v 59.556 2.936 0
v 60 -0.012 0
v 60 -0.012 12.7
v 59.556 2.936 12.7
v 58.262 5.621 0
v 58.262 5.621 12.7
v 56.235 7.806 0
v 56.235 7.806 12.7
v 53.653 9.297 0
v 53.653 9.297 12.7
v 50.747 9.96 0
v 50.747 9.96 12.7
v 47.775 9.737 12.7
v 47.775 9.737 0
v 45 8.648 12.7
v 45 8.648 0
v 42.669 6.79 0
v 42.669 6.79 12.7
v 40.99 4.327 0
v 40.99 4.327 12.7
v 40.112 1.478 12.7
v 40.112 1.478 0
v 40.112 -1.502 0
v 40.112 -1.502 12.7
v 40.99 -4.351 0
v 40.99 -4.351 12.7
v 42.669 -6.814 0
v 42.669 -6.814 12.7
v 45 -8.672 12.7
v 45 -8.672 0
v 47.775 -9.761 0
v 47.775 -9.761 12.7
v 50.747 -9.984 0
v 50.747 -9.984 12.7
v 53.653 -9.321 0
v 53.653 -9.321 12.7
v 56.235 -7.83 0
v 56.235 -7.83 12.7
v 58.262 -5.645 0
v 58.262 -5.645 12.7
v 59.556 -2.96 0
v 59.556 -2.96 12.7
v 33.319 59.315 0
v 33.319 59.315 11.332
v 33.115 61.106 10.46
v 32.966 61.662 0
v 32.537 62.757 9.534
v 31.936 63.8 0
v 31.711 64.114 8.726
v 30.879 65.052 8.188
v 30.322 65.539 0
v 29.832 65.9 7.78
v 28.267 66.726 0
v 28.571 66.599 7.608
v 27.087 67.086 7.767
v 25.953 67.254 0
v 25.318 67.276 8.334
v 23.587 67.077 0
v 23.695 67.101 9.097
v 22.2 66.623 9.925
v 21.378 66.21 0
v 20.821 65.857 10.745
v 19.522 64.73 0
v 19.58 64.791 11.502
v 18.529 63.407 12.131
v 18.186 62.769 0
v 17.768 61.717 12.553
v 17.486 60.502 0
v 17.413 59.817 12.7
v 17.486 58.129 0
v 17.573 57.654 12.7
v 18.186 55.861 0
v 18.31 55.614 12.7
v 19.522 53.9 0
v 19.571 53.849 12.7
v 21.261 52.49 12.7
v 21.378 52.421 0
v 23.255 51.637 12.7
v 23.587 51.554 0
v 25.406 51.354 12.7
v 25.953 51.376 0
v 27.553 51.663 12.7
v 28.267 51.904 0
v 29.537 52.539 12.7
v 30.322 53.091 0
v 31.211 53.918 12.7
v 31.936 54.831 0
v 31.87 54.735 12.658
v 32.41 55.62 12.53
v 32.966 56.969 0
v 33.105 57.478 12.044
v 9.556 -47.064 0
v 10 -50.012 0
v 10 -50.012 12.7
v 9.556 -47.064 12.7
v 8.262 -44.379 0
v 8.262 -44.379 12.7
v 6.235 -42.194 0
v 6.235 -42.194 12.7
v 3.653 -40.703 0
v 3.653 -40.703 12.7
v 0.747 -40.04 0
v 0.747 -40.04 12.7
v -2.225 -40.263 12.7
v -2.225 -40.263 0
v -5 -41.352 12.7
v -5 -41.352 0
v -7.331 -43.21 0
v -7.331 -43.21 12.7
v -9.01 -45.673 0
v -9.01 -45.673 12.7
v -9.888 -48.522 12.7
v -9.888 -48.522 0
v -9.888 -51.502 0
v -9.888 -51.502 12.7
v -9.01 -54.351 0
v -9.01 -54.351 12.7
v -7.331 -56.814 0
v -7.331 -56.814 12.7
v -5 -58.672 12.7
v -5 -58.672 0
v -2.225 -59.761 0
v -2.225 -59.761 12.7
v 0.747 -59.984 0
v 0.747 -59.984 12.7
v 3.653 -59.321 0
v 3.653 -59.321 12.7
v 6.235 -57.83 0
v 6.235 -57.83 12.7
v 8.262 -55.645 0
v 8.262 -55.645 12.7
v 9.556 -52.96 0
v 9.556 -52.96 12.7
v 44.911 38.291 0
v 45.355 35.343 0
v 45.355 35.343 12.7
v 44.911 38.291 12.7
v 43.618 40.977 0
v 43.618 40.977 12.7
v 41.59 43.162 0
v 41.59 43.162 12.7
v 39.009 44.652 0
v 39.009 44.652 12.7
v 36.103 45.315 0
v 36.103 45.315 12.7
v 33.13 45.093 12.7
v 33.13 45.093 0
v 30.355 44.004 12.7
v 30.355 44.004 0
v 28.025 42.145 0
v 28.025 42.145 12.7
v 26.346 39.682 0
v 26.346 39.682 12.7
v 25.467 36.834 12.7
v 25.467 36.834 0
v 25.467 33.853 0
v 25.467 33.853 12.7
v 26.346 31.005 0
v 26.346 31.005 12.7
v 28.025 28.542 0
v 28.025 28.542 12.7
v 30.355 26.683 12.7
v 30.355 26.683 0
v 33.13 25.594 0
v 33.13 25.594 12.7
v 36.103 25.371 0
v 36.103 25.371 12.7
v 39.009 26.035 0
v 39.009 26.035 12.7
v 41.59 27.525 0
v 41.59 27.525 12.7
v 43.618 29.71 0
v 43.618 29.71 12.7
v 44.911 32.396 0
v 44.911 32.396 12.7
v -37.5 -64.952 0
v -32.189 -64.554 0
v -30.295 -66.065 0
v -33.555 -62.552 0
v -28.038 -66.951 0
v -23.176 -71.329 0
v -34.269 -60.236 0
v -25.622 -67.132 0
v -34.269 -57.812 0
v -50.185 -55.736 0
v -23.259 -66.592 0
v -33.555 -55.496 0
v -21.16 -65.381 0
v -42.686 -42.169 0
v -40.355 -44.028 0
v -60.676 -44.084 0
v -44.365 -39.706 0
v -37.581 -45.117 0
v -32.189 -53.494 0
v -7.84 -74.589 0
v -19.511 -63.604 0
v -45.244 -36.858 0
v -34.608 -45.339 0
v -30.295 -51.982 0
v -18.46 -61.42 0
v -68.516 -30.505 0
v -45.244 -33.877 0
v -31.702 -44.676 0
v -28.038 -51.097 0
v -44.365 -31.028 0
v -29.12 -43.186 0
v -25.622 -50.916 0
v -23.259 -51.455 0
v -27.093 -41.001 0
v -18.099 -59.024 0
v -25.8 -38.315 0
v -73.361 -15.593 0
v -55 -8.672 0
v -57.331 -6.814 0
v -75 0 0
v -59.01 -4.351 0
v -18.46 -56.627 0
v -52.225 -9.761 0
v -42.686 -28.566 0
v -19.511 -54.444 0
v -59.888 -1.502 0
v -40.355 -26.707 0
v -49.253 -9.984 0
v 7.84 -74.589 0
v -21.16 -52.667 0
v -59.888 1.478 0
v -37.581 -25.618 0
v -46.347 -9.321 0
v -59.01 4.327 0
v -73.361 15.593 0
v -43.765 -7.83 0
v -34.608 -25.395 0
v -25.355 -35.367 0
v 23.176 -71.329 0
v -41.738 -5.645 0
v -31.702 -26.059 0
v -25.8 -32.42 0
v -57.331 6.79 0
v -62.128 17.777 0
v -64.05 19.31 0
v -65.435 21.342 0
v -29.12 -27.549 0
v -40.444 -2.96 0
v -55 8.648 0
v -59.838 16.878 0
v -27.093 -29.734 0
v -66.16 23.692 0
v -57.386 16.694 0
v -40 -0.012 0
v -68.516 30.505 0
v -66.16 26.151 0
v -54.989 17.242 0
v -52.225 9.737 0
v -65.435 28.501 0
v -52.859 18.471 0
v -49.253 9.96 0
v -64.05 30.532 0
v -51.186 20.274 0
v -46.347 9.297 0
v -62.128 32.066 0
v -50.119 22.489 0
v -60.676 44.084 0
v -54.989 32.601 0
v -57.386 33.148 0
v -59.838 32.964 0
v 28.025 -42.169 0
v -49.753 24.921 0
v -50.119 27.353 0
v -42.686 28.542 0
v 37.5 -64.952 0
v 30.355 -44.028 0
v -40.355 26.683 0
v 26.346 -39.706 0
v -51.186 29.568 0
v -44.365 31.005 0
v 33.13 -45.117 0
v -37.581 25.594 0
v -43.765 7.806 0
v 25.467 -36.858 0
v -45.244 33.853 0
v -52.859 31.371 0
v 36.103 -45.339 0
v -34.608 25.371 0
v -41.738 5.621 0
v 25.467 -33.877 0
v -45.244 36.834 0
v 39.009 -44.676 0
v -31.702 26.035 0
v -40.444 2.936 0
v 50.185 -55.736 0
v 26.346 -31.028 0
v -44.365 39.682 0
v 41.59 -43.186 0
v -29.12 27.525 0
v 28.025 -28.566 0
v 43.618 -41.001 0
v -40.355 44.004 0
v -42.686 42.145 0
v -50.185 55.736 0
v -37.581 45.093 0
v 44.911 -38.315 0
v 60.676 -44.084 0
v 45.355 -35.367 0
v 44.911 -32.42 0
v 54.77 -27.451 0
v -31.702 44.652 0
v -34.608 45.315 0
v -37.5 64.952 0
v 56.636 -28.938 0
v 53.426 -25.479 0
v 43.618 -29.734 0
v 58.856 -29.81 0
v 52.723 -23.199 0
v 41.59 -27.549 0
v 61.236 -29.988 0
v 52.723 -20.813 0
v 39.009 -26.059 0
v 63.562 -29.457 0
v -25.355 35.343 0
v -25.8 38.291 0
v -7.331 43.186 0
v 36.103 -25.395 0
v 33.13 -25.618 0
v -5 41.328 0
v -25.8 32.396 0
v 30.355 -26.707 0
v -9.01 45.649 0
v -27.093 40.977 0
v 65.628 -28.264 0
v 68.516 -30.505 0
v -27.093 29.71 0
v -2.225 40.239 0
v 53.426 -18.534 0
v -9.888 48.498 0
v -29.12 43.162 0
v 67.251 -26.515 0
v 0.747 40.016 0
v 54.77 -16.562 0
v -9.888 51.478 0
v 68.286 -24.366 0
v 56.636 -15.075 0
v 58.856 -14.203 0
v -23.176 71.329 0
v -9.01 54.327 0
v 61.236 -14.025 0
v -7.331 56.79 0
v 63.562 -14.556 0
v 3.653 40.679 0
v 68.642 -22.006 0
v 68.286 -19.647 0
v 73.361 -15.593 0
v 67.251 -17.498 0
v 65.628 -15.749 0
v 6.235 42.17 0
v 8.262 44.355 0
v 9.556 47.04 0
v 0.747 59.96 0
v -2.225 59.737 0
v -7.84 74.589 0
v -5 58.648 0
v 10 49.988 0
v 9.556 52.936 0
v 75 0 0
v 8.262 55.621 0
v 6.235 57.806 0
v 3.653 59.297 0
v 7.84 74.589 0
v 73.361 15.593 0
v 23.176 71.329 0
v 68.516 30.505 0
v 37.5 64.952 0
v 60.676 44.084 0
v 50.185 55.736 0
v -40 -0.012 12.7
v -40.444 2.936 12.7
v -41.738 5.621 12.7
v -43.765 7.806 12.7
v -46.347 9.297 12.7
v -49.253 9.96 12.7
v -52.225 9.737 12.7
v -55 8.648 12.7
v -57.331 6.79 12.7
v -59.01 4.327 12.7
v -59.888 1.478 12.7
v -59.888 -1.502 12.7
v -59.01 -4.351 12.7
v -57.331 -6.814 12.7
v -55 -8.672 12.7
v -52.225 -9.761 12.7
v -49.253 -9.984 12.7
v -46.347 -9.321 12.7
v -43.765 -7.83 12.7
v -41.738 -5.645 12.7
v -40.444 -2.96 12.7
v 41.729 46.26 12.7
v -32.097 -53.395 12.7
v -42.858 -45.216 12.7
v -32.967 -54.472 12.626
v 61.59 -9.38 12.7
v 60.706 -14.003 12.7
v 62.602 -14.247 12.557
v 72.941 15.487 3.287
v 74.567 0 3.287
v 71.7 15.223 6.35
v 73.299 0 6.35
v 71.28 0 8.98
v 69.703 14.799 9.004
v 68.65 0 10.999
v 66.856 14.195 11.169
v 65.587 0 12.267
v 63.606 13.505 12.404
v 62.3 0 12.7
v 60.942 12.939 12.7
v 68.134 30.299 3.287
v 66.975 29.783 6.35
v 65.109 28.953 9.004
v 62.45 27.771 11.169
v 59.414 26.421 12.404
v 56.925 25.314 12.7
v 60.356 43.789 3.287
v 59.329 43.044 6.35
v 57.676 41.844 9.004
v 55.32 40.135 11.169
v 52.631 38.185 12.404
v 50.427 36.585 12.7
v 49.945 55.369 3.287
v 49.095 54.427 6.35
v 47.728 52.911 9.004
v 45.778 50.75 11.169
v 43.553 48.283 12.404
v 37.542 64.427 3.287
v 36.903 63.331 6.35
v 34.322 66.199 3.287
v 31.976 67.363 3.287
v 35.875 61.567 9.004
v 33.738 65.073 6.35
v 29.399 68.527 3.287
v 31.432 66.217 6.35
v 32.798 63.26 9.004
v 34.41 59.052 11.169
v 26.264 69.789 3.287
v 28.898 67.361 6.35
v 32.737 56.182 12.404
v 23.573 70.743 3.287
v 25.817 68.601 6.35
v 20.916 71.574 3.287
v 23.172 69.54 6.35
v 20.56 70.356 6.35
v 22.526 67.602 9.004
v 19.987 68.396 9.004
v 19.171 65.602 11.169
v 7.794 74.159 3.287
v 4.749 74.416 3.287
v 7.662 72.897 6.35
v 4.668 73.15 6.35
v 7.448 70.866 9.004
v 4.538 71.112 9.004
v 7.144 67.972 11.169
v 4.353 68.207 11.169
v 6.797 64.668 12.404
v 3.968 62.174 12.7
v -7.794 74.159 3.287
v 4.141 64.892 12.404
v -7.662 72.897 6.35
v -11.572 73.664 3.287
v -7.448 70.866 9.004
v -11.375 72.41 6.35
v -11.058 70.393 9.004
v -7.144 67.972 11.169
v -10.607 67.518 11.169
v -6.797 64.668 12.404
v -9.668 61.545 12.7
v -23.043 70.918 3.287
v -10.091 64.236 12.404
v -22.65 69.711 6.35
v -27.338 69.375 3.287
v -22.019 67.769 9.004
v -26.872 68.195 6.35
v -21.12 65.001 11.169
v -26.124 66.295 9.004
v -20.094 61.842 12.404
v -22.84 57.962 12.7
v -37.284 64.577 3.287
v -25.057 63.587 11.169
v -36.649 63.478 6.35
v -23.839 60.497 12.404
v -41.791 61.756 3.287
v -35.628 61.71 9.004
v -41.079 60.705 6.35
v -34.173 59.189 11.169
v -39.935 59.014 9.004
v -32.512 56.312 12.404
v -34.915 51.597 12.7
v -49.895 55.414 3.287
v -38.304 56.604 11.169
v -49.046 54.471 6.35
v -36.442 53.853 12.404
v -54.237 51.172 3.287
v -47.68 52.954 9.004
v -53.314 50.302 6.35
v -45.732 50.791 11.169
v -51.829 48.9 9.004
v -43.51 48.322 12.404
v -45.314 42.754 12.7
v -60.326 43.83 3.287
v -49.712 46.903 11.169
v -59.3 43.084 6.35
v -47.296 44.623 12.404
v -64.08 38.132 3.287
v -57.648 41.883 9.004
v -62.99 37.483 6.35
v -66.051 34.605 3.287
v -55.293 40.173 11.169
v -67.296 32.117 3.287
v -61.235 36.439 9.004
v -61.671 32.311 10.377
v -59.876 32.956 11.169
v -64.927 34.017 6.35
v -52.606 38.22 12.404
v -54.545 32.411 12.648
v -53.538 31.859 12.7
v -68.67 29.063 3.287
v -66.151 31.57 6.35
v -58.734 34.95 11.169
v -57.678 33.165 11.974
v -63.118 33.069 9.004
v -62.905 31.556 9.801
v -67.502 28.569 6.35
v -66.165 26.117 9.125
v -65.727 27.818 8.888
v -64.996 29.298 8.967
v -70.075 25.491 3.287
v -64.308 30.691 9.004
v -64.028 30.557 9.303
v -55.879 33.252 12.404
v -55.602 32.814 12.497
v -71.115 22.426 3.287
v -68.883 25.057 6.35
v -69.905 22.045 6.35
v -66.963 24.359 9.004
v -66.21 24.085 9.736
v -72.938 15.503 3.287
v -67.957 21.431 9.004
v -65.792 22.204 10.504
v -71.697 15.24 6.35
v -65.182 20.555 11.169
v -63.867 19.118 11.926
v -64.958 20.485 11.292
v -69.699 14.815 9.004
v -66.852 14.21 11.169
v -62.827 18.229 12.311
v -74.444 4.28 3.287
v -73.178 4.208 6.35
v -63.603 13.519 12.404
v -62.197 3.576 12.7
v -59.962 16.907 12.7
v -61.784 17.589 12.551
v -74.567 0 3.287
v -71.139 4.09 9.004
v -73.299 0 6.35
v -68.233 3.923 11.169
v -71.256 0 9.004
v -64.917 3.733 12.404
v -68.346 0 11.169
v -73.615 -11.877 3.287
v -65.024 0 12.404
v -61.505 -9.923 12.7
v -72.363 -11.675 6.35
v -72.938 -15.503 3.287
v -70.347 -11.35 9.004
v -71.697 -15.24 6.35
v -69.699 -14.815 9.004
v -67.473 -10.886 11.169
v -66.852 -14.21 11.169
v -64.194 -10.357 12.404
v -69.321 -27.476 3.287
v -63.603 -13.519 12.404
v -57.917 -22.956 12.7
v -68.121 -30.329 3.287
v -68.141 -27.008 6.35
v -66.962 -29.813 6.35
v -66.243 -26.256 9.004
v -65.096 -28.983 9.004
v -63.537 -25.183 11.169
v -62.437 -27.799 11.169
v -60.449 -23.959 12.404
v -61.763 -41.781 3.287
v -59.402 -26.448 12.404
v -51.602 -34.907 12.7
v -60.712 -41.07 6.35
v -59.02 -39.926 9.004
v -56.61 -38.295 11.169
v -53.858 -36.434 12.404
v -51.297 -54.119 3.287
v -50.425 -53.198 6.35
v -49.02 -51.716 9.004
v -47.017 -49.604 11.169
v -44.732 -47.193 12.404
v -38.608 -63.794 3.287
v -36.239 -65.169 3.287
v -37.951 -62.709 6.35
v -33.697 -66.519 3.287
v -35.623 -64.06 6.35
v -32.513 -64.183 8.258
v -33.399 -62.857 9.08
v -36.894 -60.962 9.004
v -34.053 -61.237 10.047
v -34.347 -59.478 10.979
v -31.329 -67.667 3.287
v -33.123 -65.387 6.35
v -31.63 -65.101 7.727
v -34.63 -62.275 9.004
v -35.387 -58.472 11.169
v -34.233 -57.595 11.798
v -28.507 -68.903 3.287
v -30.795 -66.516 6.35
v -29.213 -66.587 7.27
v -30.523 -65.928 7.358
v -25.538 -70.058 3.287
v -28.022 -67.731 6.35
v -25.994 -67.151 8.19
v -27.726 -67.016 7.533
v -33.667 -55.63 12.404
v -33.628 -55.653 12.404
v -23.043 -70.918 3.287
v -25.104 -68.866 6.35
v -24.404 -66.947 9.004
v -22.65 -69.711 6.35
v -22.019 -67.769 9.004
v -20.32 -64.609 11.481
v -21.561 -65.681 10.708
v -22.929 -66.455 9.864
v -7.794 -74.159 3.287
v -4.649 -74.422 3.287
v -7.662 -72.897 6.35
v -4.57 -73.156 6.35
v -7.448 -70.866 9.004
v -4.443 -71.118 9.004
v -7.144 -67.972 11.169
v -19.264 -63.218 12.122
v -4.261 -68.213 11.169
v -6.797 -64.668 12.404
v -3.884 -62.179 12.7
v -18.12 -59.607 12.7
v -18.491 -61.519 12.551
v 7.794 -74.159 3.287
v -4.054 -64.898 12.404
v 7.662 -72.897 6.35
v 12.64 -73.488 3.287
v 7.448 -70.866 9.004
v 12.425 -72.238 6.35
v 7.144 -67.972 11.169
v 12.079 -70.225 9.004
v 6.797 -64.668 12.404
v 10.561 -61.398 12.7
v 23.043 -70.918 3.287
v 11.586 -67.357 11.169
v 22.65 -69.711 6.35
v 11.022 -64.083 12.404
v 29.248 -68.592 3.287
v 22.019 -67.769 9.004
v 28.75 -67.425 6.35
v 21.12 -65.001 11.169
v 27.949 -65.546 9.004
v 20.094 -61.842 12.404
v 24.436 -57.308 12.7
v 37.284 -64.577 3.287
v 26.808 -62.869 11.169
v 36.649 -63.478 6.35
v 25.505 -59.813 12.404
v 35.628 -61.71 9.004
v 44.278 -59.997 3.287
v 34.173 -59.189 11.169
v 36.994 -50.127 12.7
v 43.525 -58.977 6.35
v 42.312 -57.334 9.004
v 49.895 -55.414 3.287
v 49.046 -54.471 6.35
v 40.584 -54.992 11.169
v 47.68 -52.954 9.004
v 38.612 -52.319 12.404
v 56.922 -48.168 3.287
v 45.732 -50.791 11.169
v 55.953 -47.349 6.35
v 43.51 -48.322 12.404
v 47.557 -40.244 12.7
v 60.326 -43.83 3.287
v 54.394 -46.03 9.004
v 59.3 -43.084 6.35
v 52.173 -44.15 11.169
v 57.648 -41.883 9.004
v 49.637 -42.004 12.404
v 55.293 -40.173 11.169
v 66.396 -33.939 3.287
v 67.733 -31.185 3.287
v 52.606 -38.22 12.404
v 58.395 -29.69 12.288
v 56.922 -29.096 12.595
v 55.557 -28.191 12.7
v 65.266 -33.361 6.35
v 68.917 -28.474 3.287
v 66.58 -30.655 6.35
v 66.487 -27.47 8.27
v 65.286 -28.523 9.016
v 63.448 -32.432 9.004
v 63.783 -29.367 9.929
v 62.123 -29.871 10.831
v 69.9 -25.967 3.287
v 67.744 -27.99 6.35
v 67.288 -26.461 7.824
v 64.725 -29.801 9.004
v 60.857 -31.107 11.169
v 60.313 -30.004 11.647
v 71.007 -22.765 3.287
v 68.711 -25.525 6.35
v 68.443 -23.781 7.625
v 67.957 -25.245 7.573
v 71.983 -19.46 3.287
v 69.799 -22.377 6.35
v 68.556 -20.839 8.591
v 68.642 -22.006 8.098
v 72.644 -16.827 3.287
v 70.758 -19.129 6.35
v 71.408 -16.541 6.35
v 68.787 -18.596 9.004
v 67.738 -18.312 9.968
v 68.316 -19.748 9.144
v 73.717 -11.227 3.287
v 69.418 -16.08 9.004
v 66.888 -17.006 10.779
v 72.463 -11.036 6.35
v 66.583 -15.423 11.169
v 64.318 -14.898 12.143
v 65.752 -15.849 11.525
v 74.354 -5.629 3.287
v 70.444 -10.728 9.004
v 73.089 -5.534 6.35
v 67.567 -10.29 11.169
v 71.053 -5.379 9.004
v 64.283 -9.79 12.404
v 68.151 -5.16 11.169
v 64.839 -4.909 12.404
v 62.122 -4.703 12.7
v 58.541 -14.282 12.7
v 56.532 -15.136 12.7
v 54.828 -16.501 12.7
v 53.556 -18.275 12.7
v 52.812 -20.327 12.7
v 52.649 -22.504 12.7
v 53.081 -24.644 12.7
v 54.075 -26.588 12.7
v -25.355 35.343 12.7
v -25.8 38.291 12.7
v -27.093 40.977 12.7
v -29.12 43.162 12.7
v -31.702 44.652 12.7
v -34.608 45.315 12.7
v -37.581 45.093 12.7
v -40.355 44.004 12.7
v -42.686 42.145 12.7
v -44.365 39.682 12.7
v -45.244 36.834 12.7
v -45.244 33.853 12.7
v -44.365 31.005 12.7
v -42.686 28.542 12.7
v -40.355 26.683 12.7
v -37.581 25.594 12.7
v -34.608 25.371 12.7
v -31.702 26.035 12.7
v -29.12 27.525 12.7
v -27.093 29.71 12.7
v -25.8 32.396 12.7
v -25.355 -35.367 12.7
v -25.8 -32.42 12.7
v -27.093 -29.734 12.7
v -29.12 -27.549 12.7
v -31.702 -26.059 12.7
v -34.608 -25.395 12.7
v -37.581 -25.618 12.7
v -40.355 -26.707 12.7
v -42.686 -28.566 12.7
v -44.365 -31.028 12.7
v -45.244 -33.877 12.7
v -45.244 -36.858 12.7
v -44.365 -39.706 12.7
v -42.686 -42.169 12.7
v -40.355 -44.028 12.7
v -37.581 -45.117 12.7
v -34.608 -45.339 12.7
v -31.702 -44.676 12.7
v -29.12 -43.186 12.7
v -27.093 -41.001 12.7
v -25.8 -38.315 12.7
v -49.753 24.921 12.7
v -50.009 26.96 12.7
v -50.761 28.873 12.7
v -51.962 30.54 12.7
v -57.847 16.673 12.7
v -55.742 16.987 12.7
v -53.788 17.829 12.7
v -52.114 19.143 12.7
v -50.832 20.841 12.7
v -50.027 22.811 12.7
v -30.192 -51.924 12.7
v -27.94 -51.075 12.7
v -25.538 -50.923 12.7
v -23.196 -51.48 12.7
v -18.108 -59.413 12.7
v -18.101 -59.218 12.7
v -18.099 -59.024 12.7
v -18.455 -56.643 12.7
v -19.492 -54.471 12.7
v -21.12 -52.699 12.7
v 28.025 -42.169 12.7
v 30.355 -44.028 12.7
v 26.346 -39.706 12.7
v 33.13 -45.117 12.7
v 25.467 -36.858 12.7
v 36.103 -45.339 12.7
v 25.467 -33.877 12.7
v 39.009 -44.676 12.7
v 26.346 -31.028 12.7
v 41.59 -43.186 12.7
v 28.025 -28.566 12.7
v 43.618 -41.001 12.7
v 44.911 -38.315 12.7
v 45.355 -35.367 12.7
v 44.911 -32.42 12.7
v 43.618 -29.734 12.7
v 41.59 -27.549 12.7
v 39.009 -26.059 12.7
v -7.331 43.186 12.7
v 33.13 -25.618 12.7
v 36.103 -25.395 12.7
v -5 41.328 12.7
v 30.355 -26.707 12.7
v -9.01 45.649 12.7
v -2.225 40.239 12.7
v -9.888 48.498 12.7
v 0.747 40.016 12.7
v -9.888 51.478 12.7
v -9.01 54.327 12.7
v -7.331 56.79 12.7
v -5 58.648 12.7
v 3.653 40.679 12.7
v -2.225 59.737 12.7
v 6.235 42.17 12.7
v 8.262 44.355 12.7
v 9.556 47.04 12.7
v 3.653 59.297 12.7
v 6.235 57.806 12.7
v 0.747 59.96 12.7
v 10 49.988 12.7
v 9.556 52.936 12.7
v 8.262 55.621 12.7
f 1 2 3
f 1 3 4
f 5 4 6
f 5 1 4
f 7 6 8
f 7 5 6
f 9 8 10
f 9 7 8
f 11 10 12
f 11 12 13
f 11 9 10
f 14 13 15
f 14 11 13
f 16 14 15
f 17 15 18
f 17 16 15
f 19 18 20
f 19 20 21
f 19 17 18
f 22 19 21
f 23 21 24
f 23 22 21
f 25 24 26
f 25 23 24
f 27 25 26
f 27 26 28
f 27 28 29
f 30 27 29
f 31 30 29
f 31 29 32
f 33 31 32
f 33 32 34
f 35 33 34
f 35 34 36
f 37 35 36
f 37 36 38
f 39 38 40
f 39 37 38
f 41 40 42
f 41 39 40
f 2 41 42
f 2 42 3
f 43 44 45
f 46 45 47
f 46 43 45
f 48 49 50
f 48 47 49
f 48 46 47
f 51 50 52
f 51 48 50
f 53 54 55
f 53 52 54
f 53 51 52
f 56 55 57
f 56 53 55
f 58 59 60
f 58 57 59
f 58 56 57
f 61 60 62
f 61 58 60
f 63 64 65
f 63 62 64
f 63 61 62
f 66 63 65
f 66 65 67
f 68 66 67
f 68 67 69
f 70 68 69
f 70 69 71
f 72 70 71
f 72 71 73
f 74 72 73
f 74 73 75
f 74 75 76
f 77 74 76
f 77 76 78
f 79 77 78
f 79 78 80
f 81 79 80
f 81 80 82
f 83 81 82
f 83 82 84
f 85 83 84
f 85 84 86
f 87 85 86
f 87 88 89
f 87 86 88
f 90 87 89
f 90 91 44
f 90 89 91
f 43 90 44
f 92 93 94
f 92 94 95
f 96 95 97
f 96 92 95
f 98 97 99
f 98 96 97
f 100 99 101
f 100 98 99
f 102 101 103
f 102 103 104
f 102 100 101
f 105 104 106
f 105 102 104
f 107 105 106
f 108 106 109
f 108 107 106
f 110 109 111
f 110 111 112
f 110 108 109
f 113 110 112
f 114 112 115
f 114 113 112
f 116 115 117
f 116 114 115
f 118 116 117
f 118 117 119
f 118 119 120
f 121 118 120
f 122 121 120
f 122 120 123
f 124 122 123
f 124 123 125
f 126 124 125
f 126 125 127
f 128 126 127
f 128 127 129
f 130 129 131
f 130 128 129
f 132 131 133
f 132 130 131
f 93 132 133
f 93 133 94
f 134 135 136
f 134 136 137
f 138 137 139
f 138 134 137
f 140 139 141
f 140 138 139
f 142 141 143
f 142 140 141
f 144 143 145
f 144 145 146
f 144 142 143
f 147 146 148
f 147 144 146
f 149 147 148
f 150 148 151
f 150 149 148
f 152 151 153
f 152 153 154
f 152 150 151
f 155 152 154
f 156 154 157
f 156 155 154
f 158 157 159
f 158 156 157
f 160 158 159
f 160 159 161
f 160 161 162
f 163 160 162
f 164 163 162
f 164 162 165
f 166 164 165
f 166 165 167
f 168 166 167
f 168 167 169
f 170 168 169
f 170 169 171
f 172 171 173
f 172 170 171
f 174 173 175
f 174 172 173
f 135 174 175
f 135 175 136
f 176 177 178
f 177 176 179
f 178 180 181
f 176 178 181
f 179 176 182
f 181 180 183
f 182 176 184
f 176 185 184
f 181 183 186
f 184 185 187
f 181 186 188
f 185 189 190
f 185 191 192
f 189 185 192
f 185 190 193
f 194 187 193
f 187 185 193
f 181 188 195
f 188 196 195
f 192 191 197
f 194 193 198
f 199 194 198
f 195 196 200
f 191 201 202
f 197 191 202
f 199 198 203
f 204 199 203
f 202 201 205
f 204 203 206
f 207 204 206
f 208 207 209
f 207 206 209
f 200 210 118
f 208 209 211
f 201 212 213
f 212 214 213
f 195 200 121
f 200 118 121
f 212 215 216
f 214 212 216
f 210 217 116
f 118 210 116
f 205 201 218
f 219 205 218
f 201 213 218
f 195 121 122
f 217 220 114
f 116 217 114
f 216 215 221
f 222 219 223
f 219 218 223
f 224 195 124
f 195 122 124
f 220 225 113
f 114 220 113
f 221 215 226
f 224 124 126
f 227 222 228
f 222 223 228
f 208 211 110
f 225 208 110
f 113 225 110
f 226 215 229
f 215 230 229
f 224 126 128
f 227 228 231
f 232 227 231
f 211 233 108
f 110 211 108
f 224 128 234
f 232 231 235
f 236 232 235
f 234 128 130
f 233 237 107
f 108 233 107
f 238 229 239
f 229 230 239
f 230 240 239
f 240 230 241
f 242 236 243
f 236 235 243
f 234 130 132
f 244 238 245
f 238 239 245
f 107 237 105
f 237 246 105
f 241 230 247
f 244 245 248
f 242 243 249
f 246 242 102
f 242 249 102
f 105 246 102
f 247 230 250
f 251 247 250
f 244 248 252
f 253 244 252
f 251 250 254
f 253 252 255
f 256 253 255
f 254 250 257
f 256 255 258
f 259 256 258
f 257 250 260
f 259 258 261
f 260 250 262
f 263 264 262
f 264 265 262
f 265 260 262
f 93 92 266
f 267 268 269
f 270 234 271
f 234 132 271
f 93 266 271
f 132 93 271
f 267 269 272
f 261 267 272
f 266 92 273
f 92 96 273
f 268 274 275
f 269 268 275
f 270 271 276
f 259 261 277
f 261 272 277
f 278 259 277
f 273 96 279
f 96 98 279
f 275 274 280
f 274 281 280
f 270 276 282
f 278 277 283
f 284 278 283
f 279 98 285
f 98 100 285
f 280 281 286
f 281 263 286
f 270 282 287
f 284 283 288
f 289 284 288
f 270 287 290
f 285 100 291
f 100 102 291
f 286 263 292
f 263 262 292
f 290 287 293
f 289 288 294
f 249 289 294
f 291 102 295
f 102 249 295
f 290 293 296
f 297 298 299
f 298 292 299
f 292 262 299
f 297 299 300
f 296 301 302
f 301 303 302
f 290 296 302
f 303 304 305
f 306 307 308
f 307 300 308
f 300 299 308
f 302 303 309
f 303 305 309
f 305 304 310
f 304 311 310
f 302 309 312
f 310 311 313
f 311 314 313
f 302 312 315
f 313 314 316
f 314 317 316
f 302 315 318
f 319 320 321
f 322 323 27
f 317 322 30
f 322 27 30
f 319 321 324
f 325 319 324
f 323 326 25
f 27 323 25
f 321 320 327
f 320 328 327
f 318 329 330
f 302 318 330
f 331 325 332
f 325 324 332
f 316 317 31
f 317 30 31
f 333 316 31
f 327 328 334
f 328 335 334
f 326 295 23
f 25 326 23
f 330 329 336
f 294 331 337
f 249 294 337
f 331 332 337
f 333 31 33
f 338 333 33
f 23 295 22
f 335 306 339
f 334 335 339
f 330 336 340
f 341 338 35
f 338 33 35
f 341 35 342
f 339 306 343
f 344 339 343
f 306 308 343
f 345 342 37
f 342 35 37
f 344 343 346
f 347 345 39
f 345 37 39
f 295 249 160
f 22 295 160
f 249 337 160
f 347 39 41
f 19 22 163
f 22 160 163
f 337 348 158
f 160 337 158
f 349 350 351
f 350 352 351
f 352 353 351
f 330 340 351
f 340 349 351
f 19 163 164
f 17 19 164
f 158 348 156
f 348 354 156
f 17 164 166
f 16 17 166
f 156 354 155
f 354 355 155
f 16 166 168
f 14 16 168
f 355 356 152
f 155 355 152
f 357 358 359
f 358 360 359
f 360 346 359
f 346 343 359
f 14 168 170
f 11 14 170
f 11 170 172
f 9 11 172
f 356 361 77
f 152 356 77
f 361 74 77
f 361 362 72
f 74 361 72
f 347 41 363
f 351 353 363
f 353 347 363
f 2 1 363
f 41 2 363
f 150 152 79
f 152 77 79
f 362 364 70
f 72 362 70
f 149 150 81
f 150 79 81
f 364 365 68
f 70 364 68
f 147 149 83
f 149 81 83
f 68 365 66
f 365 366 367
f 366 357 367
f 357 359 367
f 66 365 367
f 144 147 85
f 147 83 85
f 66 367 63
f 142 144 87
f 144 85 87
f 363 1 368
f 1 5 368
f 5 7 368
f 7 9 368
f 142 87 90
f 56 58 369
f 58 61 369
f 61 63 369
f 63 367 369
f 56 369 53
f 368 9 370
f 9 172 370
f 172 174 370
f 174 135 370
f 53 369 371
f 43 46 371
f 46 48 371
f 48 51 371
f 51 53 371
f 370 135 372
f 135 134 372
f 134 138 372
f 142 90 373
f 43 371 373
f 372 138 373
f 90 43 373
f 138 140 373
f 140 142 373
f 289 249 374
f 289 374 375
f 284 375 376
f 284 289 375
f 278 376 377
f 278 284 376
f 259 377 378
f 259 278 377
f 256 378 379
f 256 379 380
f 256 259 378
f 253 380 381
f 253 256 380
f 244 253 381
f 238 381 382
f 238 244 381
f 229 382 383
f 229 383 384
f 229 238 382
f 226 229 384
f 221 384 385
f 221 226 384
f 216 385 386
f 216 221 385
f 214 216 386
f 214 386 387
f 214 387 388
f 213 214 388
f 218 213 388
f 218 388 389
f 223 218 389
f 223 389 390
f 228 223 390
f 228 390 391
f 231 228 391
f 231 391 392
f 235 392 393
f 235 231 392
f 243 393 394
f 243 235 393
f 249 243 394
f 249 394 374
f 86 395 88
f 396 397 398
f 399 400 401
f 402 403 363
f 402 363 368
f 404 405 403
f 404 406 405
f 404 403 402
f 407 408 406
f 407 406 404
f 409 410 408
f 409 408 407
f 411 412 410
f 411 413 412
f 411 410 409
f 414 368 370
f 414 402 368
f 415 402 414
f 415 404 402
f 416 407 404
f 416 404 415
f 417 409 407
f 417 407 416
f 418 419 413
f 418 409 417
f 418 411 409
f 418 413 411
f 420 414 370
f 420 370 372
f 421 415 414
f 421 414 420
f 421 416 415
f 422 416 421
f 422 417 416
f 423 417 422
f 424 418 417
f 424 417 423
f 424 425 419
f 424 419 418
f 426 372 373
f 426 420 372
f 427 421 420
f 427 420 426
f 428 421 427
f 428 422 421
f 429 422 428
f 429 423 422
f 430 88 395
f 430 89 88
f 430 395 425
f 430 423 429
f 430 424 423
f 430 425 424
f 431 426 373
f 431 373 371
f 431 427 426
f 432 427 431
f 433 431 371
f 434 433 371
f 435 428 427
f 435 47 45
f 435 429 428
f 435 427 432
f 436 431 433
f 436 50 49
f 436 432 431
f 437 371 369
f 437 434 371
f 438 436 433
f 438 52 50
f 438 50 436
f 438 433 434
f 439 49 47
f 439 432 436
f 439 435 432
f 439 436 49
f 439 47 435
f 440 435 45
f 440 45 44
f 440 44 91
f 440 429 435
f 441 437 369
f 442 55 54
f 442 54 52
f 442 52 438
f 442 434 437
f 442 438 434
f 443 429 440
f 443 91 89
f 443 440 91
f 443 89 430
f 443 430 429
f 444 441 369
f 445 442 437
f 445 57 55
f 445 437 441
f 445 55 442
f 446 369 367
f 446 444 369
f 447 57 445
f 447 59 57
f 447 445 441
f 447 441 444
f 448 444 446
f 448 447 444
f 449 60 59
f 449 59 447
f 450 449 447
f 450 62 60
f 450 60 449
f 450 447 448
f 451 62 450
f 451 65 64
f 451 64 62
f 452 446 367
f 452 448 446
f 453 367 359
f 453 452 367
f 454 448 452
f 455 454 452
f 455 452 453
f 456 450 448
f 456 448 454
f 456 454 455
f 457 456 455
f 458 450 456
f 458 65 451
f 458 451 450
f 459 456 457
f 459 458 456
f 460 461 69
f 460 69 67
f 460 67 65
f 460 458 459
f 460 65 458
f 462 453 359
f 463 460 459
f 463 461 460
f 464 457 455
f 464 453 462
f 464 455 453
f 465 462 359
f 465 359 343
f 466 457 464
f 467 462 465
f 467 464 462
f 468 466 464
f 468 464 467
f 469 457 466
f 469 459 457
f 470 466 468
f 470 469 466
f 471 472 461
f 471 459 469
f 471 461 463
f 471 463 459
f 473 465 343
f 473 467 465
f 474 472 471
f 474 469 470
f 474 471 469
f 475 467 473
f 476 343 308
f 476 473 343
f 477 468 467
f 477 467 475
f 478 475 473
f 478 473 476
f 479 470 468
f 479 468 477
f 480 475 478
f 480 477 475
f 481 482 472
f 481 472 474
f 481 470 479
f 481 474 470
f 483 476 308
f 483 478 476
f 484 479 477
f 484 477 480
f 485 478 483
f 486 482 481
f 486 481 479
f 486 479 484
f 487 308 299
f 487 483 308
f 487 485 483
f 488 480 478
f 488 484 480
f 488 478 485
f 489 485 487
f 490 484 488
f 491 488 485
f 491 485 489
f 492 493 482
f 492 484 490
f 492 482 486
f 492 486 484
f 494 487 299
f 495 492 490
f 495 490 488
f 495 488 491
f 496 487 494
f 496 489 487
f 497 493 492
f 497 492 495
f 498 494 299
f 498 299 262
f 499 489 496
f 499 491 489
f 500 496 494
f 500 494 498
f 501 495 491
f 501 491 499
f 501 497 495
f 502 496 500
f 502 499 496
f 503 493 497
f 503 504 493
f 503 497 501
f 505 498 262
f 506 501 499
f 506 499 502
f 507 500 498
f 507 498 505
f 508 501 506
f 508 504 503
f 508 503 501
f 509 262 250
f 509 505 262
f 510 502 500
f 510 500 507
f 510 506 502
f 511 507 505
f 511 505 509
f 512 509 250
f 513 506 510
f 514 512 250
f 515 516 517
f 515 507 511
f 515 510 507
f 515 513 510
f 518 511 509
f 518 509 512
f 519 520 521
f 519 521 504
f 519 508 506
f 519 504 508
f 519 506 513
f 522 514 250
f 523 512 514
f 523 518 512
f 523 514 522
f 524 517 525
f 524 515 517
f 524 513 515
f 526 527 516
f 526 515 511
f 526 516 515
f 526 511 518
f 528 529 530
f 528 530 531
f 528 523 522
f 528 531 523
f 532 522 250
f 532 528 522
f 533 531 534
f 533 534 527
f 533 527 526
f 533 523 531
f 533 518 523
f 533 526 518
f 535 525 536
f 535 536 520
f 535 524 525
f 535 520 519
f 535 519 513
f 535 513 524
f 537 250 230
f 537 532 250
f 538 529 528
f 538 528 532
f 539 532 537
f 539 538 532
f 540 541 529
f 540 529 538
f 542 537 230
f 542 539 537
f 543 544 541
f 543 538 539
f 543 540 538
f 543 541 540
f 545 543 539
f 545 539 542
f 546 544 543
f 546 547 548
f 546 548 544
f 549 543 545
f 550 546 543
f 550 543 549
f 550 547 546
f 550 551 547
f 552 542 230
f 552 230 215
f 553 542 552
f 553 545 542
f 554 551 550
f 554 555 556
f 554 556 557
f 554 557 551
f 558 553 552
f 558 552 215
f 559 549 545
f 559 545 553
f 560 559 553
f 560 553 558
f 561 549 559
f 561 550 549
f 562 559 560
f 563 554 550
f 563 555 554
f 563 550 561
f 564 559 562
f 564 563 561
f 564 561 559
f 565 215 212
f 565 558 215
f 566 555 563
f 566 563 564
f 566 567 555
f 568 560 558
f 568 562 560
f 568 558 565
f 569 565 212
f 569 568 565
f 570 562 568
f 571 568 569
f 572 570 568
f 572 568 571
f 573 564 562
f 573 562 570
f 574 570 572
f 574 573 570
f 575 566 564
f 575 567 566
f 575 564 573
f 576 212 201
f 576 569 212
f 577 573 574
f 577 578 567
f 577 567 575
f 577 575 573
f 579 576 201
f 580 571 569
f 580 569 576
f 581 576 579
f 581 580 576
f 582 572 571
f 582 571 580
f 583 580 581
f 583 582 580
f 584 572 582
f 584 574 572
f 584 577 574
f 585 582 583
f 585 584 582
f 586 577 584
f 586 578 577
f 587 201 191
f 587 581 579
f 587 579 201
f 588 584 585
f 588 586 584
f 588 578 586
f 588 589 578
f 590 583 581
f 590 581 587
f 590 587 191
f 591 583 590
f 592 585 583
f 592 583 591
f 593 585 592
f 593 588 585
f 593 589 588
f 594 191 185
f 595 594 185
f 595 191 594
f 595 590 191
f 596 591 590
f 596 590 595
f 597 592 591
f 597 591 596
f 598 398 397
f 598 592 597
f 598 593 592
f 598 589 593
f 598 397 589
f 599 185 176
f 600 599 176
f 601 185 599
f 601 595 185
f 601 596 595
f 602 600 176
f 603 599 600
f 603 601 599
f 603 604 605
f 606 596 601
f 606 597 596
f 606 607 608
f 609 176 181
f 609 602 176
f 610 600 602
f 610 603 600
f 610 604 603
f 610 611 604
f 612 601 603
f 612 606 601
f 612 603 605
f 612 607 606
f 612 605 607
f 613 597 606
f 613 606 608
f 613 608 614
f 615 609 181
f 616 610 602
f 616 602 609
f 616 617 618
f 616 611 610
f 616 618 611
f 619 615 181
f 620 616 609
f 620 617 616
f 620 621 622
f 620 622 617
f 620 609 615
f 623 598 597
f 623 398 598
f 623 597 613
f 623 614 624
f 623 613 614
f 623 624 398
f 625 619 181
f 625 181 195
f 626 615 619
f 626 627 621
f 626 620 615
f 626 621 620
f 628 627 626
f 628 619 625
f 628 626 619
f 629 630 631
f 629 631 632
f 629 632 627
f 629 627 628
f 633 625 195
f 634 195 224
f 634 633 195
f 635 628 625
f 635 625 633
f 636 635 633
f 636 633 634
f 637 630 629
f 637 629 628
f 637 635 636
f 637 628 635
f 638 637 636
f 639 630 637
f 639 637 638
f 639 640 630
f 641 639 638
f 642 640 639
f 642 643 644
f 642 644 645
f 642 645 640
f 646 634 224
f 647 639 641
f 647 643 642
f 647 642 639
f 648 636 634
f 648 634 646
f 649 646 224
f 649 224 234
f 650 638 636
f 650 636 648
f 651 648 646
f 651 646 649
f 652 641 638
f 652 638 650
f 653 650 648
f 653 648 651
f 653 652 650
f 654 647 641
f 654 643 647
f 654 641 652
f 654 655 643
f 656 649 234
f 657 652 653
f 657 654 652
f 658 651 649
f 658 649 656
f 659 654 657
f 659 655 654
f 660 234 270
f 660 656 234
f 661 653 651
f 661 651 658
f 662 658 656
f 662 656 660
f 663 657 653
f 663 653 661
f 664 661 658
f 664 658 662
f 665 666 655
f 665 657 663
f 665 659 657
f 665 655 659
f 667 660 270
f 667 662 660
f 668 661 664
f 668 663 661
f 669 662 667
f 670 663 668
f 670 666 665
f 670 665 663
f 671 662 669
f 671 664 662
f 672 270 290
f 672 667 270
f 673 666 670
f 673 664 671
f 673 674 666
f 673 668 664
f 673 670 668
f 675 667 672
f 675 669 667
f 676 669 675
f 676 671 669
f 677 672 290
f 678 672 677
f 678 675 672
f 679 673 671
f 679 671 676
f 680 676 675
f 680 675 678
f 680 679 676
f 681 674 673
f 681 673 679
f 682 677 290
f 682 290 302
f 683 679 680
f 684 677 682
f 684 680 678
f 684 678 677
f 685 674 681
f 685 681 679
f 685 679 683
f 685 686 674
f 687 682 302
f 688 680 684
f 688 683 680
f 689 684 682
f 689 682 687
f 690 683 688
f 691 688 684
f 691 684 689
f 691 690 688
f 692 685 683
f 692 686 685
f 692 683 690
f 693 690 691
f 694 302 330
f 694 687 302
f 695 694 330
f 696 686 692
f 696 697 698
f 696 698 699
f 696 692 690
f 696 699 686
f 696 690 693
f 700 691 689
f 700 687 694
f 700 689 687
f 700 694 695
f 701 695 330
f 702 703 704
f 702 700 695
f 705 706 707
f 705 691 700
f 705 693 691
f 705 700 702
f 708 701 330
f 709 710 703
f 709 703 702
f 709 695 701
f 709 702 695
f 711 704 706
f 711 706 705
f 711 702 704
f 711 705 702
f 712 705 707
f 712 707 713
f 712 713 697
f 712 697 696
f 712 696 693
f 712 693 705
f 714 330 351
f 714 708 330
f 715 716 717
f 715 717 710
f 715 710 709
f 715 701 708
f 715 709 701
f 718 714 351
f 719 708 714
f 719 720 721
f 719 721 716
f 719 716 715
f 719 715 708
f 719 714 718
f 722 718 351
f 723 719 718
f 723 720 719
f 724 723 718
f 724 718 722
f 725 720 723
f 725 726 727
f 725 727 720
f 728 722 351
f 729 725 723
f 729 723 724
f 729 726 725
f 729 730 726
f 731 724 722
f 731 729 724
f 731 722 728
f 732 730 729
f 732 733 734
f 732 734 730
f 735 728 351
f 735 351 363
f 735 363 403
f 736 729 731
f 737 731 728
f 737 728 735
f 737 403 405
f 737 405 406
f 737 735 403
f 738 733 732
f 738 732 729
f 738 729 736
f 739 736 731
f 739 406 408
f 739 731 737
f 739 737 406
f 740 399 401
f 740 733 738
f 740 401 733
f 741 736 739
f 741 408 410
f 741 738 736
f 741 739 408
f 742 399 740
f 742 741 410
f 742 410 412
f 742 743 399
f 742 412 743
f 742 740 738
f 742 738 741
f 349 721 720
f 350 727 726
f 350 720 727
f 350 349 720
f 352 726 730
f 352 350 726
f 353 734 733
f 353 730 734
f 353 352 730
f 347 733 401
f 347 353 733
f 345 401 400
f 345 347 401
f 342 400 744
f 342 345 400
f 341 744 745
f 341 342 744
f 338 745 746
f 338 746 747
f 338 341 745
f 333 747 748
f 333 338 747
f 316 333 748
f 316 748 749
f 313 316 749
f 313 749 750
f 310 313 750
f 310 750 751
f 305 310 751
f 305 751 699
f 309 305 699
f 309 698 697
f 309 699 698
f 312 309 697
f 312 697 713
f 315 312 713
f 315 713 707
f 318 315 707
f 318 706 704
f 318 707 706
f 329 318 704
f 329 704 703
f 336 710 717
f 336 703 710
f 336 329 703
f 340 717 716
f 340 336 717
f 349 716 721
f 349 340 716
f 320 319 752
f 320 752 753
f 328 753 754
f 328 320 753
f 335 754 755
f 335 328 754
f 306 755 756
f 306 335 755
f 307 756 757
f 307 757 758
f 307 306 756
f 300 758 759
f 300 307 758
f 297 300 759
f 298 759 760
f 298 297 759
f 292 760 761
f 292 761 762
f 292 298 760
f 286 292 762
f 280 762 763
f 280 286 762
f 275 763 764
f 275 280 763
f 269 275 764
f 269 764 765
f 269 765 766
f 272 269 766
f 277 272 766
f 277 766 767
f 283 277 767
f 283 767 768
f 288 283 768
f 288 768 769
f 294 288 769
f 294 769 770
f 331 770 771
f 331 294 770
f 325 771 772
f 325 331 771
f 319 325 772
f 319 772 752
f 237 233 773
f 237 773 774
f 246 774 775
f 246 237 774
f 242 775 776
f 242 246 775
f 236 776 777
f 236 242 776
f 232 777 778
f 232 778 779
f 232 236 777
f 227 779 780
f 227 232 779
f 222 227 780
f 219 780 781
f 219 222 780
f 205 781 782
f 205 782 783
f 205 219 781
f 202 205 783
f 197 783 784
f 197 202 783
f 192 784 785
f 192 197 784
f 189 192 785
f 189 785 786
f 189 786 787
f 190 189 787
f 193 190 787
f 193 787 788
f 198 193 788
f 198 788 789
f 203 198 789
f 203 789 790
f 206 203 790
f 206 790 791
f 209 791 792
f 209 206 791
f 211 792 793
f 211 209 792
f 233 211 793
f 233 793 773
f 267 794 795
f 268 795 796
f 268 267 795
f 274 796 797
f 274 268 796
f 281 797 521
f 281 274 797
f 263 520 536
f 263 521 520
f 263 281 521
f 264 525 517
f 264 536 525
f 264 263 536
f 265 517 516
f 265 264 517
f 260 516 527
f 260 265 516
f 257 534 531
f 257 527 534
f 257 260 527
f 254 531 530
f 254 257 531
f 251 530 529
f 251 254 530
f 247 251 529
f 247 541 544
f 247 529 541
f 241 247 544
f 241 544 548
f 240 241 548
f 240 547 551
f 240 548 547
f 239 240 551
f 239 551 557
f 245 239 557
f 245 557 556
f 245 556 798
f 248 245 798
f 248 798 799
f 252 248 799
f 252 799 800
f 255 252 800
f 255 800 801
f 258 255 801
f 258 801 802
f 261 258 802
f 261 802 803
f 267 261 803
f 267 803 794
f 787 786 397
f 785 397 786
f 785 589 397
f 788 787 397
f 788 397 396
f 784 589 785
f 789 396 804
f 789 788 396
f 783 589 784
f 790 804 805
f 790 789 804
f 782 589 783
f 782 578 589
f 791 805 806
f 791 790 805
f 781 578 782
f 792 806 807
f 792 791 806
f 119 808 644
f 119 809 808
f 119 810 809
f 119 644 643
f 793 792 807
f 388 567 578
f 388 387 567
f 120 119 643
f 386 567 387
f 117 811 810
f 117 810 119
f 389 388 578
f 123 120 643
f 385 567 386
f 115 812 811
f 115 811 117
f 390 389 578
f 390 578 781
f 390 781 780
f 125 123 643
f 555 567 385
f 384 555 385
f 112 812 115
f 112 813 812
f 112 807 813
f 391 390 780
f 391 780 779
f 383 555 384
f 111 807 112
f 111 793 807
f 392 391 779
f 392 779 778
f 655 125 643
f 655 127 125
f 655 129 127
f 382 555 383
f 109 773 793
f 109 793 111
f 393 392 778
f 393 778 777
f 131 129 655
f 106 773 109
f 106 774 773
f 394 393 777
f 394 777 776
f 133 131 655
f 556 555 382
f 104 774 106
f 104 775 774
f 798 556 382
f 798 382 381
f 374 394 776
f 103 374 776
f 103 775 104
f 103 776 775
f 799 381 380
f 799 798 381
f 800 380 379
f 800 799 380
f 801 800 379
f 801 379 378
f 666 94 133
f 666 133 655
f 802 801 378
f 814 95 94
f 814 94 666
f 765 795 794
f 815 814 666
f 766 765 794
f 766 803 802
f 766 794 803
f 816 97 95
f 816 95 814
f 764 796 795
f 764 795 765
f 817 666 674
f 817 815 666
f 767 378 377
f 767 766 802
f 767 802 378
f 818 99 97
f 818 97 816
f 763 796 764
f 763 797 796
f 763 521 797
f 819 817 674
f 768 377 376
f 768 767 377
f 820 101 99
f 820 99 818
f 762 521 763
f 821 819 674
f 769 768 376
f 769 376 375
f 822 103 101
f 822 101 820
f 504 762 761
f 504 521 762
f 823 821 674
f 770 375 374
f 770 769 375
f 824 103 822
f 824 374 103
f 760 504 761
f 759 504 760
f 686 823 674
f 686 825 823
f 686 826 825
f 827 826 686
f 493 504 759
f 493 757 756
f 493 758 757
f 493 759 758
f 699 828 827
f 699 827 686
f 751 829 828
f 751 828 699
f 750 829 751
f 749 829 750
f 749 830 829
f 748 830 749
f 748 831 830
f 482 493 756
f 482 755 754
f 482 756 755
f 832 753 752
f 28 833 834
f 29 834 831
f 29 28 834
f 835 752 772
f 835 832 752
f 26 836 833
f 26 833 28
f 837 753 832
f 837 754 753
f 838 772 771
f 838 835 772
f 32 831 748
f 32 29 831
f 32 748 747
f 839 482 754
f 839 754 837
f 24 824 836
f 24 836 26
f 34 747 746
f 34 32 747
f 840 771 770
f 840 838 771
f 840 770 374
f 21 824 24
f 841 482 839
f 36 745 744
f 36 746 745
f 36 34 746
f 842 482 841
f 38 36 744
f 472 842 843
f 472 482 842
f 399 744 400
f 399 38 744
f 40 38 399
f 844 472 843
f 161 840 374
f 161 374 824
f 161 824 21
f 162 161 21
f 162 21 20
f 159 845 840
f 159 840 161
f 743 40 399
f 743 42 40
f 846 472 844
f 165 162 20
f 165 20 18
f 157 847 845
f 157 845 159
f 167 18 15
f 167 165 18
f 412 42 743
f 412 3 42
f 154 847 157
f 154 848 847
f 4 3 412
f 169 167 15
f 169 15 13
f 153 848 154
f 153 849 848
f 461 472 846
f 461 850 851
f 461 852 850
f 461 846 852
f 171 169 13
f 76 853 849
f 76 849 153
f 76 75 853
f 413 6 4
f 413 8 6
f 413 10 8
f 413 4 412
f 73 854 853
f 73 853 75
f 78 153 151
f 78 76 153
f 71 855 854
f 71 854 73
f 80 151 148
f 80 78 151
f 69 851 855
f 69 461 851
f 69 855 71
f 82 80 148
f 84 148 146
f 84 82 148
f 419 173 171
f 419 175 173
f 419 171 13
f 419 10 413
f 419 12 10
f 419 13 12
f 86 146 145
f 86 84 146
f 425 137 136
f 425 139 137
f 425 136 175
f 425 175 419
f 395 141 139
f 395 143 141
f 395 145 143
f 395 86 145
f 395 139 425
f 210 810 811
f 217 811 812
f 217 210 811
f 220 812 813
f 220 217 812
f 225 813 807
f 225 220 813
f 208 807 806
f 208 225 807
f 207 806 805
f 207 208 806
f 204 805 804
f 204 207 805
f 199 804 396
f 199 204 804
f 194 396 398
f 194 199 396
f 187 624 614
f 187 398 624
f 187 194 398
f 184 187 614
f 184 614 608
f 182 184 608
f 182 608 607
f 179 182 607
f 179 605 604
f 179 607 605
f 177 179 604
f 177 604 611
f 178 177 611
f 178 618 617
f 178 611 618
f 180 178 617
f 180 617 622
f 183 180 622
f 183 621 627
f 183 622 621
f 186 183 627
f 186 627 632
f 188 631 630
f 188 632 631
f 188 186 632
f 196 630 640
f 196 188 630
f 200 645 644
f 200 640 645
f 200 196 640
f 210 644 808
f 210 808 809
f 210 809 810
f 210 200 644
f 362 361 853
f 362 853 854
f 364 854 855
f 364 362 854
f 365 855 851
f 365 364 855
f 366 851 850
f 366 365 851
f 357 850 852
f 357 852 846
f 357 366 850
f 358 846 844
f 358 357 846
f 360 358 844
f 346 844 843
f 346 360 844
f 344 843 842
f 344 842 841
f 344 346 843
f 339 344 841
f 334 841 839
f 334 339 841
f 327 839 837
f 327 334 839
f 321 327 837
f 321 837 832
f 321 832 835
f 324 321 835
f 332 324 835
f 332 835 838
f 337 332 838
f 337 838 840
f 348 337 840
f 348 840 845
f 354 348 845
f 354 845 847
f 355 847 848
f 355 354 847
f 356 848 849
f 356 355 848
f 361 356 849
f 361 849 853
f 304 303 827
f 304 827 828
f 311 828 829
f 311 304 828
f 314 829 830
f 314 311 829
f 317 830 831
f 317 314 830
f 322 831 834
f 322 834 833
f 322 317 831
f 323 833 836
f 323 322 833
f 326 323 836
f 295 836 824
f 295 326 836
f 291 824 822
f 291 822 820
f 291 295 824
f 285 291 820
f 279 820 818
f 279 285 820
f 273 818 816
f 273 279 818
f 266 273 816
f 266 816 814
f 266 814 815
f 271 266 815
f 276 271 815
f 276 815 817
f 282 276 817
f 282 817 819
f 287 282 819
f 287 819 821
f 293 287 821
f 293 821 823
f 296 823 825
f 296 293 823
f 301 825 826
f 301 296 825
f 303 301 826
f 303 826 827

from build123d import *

# Parameters (mm, degrees)
F0_R     = 75
F0_R_2   = 8.1306454005
F0_R_3   = 10
F0_R_4   = 8.004103626
F0_R_5   = 8.2498069198
F0_R_6   = 7.9610699334
F1_DEPTH = 12.7


# Not quite as in the source:
# - a fillet or chamfer that OpenCascade refuses, or shapes differently, is made with other operations: its cross-section is extruded or revolved along the edge and cut away or added
# - the program builds the solid bodies; features that only make, move or delete a surface that nothing else refers to are left out


with BuildPart() as f1:
    # F0 (on Top) → F1 (new body)
    with BuildSketch(Plane.XY):
        Circle(F0_R)
        with Locations((-26.2292288244, -59.023771435)):
            Circle(F0_R_2, mode=Mode.SUBTRACT)
        with Locations((-50, -0.0119686127)):
            Circle(F0_R_3, mode=Mode.SUBTRACT)
        with Locations((-35.3553390593, -35.367307672)):
            Circle(F0_R_3, mode=Mode.SUBTRACT)
        with Locations((0, -50.0119686127)):
            Circle(F0_R_3, mode=Mode.SUBTRACT)
        with Locations((35.3553390593, -35.367307672)):
            Circle(F0_R_3, mode=Mode.SUBTRACT)
        with Locations((60.637563467, -22.0063943416)):
            Circle(F0_R_4, mode=Mode.SUBTRACT)
        with Locations((50, -0.0119686127)):
            Circle(F0_R_3, mode=Mode.SUBTRACT)
        with Locations((-58.0026507378, 24.9211471528)):
            Circle(F0_R_5, mode=Mode.SUBTRACT)
        with Locations((-35.3553390593, 35.3433704467)):
            Circle(F0_R_3, mode=Mode.SUBTRACT)
        with Locations((35.3553390593, 35.3433704467)):
            Circle(F0_R_3, mode=Mode.SUBTRACT)
        with Locations((0, 49.9880313873)):
            Circle(F0_R_3, mode=Mode.SUBTRACT)
        with Locations((25.3583583981, 59.3152455986)):
            Circle(F0_R_6, mode=Mode.SUBTRACT)
    extrude(amount=F1_DEPTH)

    # F2: fillet of radius 12.7 on 1 edges, made by hand

    # F2_s1 → F2_t2 (revolve, cut)
    with BuildSketch(Plane.XZ):
        with BuildLine():
            ThreePointArc((75, 0), (71.2802561211, 8.9802561211), (62.3, 12.7))
            Line((62.3, 12.7), (75, 12.7))
            Line((75, 12.7), (75, 0))
        make_face()
    revolve(axis=Axis((0, 0, 12.7), (0, 0, 1)), mode=Mode.SUBTRACT)


solid = f1.part
